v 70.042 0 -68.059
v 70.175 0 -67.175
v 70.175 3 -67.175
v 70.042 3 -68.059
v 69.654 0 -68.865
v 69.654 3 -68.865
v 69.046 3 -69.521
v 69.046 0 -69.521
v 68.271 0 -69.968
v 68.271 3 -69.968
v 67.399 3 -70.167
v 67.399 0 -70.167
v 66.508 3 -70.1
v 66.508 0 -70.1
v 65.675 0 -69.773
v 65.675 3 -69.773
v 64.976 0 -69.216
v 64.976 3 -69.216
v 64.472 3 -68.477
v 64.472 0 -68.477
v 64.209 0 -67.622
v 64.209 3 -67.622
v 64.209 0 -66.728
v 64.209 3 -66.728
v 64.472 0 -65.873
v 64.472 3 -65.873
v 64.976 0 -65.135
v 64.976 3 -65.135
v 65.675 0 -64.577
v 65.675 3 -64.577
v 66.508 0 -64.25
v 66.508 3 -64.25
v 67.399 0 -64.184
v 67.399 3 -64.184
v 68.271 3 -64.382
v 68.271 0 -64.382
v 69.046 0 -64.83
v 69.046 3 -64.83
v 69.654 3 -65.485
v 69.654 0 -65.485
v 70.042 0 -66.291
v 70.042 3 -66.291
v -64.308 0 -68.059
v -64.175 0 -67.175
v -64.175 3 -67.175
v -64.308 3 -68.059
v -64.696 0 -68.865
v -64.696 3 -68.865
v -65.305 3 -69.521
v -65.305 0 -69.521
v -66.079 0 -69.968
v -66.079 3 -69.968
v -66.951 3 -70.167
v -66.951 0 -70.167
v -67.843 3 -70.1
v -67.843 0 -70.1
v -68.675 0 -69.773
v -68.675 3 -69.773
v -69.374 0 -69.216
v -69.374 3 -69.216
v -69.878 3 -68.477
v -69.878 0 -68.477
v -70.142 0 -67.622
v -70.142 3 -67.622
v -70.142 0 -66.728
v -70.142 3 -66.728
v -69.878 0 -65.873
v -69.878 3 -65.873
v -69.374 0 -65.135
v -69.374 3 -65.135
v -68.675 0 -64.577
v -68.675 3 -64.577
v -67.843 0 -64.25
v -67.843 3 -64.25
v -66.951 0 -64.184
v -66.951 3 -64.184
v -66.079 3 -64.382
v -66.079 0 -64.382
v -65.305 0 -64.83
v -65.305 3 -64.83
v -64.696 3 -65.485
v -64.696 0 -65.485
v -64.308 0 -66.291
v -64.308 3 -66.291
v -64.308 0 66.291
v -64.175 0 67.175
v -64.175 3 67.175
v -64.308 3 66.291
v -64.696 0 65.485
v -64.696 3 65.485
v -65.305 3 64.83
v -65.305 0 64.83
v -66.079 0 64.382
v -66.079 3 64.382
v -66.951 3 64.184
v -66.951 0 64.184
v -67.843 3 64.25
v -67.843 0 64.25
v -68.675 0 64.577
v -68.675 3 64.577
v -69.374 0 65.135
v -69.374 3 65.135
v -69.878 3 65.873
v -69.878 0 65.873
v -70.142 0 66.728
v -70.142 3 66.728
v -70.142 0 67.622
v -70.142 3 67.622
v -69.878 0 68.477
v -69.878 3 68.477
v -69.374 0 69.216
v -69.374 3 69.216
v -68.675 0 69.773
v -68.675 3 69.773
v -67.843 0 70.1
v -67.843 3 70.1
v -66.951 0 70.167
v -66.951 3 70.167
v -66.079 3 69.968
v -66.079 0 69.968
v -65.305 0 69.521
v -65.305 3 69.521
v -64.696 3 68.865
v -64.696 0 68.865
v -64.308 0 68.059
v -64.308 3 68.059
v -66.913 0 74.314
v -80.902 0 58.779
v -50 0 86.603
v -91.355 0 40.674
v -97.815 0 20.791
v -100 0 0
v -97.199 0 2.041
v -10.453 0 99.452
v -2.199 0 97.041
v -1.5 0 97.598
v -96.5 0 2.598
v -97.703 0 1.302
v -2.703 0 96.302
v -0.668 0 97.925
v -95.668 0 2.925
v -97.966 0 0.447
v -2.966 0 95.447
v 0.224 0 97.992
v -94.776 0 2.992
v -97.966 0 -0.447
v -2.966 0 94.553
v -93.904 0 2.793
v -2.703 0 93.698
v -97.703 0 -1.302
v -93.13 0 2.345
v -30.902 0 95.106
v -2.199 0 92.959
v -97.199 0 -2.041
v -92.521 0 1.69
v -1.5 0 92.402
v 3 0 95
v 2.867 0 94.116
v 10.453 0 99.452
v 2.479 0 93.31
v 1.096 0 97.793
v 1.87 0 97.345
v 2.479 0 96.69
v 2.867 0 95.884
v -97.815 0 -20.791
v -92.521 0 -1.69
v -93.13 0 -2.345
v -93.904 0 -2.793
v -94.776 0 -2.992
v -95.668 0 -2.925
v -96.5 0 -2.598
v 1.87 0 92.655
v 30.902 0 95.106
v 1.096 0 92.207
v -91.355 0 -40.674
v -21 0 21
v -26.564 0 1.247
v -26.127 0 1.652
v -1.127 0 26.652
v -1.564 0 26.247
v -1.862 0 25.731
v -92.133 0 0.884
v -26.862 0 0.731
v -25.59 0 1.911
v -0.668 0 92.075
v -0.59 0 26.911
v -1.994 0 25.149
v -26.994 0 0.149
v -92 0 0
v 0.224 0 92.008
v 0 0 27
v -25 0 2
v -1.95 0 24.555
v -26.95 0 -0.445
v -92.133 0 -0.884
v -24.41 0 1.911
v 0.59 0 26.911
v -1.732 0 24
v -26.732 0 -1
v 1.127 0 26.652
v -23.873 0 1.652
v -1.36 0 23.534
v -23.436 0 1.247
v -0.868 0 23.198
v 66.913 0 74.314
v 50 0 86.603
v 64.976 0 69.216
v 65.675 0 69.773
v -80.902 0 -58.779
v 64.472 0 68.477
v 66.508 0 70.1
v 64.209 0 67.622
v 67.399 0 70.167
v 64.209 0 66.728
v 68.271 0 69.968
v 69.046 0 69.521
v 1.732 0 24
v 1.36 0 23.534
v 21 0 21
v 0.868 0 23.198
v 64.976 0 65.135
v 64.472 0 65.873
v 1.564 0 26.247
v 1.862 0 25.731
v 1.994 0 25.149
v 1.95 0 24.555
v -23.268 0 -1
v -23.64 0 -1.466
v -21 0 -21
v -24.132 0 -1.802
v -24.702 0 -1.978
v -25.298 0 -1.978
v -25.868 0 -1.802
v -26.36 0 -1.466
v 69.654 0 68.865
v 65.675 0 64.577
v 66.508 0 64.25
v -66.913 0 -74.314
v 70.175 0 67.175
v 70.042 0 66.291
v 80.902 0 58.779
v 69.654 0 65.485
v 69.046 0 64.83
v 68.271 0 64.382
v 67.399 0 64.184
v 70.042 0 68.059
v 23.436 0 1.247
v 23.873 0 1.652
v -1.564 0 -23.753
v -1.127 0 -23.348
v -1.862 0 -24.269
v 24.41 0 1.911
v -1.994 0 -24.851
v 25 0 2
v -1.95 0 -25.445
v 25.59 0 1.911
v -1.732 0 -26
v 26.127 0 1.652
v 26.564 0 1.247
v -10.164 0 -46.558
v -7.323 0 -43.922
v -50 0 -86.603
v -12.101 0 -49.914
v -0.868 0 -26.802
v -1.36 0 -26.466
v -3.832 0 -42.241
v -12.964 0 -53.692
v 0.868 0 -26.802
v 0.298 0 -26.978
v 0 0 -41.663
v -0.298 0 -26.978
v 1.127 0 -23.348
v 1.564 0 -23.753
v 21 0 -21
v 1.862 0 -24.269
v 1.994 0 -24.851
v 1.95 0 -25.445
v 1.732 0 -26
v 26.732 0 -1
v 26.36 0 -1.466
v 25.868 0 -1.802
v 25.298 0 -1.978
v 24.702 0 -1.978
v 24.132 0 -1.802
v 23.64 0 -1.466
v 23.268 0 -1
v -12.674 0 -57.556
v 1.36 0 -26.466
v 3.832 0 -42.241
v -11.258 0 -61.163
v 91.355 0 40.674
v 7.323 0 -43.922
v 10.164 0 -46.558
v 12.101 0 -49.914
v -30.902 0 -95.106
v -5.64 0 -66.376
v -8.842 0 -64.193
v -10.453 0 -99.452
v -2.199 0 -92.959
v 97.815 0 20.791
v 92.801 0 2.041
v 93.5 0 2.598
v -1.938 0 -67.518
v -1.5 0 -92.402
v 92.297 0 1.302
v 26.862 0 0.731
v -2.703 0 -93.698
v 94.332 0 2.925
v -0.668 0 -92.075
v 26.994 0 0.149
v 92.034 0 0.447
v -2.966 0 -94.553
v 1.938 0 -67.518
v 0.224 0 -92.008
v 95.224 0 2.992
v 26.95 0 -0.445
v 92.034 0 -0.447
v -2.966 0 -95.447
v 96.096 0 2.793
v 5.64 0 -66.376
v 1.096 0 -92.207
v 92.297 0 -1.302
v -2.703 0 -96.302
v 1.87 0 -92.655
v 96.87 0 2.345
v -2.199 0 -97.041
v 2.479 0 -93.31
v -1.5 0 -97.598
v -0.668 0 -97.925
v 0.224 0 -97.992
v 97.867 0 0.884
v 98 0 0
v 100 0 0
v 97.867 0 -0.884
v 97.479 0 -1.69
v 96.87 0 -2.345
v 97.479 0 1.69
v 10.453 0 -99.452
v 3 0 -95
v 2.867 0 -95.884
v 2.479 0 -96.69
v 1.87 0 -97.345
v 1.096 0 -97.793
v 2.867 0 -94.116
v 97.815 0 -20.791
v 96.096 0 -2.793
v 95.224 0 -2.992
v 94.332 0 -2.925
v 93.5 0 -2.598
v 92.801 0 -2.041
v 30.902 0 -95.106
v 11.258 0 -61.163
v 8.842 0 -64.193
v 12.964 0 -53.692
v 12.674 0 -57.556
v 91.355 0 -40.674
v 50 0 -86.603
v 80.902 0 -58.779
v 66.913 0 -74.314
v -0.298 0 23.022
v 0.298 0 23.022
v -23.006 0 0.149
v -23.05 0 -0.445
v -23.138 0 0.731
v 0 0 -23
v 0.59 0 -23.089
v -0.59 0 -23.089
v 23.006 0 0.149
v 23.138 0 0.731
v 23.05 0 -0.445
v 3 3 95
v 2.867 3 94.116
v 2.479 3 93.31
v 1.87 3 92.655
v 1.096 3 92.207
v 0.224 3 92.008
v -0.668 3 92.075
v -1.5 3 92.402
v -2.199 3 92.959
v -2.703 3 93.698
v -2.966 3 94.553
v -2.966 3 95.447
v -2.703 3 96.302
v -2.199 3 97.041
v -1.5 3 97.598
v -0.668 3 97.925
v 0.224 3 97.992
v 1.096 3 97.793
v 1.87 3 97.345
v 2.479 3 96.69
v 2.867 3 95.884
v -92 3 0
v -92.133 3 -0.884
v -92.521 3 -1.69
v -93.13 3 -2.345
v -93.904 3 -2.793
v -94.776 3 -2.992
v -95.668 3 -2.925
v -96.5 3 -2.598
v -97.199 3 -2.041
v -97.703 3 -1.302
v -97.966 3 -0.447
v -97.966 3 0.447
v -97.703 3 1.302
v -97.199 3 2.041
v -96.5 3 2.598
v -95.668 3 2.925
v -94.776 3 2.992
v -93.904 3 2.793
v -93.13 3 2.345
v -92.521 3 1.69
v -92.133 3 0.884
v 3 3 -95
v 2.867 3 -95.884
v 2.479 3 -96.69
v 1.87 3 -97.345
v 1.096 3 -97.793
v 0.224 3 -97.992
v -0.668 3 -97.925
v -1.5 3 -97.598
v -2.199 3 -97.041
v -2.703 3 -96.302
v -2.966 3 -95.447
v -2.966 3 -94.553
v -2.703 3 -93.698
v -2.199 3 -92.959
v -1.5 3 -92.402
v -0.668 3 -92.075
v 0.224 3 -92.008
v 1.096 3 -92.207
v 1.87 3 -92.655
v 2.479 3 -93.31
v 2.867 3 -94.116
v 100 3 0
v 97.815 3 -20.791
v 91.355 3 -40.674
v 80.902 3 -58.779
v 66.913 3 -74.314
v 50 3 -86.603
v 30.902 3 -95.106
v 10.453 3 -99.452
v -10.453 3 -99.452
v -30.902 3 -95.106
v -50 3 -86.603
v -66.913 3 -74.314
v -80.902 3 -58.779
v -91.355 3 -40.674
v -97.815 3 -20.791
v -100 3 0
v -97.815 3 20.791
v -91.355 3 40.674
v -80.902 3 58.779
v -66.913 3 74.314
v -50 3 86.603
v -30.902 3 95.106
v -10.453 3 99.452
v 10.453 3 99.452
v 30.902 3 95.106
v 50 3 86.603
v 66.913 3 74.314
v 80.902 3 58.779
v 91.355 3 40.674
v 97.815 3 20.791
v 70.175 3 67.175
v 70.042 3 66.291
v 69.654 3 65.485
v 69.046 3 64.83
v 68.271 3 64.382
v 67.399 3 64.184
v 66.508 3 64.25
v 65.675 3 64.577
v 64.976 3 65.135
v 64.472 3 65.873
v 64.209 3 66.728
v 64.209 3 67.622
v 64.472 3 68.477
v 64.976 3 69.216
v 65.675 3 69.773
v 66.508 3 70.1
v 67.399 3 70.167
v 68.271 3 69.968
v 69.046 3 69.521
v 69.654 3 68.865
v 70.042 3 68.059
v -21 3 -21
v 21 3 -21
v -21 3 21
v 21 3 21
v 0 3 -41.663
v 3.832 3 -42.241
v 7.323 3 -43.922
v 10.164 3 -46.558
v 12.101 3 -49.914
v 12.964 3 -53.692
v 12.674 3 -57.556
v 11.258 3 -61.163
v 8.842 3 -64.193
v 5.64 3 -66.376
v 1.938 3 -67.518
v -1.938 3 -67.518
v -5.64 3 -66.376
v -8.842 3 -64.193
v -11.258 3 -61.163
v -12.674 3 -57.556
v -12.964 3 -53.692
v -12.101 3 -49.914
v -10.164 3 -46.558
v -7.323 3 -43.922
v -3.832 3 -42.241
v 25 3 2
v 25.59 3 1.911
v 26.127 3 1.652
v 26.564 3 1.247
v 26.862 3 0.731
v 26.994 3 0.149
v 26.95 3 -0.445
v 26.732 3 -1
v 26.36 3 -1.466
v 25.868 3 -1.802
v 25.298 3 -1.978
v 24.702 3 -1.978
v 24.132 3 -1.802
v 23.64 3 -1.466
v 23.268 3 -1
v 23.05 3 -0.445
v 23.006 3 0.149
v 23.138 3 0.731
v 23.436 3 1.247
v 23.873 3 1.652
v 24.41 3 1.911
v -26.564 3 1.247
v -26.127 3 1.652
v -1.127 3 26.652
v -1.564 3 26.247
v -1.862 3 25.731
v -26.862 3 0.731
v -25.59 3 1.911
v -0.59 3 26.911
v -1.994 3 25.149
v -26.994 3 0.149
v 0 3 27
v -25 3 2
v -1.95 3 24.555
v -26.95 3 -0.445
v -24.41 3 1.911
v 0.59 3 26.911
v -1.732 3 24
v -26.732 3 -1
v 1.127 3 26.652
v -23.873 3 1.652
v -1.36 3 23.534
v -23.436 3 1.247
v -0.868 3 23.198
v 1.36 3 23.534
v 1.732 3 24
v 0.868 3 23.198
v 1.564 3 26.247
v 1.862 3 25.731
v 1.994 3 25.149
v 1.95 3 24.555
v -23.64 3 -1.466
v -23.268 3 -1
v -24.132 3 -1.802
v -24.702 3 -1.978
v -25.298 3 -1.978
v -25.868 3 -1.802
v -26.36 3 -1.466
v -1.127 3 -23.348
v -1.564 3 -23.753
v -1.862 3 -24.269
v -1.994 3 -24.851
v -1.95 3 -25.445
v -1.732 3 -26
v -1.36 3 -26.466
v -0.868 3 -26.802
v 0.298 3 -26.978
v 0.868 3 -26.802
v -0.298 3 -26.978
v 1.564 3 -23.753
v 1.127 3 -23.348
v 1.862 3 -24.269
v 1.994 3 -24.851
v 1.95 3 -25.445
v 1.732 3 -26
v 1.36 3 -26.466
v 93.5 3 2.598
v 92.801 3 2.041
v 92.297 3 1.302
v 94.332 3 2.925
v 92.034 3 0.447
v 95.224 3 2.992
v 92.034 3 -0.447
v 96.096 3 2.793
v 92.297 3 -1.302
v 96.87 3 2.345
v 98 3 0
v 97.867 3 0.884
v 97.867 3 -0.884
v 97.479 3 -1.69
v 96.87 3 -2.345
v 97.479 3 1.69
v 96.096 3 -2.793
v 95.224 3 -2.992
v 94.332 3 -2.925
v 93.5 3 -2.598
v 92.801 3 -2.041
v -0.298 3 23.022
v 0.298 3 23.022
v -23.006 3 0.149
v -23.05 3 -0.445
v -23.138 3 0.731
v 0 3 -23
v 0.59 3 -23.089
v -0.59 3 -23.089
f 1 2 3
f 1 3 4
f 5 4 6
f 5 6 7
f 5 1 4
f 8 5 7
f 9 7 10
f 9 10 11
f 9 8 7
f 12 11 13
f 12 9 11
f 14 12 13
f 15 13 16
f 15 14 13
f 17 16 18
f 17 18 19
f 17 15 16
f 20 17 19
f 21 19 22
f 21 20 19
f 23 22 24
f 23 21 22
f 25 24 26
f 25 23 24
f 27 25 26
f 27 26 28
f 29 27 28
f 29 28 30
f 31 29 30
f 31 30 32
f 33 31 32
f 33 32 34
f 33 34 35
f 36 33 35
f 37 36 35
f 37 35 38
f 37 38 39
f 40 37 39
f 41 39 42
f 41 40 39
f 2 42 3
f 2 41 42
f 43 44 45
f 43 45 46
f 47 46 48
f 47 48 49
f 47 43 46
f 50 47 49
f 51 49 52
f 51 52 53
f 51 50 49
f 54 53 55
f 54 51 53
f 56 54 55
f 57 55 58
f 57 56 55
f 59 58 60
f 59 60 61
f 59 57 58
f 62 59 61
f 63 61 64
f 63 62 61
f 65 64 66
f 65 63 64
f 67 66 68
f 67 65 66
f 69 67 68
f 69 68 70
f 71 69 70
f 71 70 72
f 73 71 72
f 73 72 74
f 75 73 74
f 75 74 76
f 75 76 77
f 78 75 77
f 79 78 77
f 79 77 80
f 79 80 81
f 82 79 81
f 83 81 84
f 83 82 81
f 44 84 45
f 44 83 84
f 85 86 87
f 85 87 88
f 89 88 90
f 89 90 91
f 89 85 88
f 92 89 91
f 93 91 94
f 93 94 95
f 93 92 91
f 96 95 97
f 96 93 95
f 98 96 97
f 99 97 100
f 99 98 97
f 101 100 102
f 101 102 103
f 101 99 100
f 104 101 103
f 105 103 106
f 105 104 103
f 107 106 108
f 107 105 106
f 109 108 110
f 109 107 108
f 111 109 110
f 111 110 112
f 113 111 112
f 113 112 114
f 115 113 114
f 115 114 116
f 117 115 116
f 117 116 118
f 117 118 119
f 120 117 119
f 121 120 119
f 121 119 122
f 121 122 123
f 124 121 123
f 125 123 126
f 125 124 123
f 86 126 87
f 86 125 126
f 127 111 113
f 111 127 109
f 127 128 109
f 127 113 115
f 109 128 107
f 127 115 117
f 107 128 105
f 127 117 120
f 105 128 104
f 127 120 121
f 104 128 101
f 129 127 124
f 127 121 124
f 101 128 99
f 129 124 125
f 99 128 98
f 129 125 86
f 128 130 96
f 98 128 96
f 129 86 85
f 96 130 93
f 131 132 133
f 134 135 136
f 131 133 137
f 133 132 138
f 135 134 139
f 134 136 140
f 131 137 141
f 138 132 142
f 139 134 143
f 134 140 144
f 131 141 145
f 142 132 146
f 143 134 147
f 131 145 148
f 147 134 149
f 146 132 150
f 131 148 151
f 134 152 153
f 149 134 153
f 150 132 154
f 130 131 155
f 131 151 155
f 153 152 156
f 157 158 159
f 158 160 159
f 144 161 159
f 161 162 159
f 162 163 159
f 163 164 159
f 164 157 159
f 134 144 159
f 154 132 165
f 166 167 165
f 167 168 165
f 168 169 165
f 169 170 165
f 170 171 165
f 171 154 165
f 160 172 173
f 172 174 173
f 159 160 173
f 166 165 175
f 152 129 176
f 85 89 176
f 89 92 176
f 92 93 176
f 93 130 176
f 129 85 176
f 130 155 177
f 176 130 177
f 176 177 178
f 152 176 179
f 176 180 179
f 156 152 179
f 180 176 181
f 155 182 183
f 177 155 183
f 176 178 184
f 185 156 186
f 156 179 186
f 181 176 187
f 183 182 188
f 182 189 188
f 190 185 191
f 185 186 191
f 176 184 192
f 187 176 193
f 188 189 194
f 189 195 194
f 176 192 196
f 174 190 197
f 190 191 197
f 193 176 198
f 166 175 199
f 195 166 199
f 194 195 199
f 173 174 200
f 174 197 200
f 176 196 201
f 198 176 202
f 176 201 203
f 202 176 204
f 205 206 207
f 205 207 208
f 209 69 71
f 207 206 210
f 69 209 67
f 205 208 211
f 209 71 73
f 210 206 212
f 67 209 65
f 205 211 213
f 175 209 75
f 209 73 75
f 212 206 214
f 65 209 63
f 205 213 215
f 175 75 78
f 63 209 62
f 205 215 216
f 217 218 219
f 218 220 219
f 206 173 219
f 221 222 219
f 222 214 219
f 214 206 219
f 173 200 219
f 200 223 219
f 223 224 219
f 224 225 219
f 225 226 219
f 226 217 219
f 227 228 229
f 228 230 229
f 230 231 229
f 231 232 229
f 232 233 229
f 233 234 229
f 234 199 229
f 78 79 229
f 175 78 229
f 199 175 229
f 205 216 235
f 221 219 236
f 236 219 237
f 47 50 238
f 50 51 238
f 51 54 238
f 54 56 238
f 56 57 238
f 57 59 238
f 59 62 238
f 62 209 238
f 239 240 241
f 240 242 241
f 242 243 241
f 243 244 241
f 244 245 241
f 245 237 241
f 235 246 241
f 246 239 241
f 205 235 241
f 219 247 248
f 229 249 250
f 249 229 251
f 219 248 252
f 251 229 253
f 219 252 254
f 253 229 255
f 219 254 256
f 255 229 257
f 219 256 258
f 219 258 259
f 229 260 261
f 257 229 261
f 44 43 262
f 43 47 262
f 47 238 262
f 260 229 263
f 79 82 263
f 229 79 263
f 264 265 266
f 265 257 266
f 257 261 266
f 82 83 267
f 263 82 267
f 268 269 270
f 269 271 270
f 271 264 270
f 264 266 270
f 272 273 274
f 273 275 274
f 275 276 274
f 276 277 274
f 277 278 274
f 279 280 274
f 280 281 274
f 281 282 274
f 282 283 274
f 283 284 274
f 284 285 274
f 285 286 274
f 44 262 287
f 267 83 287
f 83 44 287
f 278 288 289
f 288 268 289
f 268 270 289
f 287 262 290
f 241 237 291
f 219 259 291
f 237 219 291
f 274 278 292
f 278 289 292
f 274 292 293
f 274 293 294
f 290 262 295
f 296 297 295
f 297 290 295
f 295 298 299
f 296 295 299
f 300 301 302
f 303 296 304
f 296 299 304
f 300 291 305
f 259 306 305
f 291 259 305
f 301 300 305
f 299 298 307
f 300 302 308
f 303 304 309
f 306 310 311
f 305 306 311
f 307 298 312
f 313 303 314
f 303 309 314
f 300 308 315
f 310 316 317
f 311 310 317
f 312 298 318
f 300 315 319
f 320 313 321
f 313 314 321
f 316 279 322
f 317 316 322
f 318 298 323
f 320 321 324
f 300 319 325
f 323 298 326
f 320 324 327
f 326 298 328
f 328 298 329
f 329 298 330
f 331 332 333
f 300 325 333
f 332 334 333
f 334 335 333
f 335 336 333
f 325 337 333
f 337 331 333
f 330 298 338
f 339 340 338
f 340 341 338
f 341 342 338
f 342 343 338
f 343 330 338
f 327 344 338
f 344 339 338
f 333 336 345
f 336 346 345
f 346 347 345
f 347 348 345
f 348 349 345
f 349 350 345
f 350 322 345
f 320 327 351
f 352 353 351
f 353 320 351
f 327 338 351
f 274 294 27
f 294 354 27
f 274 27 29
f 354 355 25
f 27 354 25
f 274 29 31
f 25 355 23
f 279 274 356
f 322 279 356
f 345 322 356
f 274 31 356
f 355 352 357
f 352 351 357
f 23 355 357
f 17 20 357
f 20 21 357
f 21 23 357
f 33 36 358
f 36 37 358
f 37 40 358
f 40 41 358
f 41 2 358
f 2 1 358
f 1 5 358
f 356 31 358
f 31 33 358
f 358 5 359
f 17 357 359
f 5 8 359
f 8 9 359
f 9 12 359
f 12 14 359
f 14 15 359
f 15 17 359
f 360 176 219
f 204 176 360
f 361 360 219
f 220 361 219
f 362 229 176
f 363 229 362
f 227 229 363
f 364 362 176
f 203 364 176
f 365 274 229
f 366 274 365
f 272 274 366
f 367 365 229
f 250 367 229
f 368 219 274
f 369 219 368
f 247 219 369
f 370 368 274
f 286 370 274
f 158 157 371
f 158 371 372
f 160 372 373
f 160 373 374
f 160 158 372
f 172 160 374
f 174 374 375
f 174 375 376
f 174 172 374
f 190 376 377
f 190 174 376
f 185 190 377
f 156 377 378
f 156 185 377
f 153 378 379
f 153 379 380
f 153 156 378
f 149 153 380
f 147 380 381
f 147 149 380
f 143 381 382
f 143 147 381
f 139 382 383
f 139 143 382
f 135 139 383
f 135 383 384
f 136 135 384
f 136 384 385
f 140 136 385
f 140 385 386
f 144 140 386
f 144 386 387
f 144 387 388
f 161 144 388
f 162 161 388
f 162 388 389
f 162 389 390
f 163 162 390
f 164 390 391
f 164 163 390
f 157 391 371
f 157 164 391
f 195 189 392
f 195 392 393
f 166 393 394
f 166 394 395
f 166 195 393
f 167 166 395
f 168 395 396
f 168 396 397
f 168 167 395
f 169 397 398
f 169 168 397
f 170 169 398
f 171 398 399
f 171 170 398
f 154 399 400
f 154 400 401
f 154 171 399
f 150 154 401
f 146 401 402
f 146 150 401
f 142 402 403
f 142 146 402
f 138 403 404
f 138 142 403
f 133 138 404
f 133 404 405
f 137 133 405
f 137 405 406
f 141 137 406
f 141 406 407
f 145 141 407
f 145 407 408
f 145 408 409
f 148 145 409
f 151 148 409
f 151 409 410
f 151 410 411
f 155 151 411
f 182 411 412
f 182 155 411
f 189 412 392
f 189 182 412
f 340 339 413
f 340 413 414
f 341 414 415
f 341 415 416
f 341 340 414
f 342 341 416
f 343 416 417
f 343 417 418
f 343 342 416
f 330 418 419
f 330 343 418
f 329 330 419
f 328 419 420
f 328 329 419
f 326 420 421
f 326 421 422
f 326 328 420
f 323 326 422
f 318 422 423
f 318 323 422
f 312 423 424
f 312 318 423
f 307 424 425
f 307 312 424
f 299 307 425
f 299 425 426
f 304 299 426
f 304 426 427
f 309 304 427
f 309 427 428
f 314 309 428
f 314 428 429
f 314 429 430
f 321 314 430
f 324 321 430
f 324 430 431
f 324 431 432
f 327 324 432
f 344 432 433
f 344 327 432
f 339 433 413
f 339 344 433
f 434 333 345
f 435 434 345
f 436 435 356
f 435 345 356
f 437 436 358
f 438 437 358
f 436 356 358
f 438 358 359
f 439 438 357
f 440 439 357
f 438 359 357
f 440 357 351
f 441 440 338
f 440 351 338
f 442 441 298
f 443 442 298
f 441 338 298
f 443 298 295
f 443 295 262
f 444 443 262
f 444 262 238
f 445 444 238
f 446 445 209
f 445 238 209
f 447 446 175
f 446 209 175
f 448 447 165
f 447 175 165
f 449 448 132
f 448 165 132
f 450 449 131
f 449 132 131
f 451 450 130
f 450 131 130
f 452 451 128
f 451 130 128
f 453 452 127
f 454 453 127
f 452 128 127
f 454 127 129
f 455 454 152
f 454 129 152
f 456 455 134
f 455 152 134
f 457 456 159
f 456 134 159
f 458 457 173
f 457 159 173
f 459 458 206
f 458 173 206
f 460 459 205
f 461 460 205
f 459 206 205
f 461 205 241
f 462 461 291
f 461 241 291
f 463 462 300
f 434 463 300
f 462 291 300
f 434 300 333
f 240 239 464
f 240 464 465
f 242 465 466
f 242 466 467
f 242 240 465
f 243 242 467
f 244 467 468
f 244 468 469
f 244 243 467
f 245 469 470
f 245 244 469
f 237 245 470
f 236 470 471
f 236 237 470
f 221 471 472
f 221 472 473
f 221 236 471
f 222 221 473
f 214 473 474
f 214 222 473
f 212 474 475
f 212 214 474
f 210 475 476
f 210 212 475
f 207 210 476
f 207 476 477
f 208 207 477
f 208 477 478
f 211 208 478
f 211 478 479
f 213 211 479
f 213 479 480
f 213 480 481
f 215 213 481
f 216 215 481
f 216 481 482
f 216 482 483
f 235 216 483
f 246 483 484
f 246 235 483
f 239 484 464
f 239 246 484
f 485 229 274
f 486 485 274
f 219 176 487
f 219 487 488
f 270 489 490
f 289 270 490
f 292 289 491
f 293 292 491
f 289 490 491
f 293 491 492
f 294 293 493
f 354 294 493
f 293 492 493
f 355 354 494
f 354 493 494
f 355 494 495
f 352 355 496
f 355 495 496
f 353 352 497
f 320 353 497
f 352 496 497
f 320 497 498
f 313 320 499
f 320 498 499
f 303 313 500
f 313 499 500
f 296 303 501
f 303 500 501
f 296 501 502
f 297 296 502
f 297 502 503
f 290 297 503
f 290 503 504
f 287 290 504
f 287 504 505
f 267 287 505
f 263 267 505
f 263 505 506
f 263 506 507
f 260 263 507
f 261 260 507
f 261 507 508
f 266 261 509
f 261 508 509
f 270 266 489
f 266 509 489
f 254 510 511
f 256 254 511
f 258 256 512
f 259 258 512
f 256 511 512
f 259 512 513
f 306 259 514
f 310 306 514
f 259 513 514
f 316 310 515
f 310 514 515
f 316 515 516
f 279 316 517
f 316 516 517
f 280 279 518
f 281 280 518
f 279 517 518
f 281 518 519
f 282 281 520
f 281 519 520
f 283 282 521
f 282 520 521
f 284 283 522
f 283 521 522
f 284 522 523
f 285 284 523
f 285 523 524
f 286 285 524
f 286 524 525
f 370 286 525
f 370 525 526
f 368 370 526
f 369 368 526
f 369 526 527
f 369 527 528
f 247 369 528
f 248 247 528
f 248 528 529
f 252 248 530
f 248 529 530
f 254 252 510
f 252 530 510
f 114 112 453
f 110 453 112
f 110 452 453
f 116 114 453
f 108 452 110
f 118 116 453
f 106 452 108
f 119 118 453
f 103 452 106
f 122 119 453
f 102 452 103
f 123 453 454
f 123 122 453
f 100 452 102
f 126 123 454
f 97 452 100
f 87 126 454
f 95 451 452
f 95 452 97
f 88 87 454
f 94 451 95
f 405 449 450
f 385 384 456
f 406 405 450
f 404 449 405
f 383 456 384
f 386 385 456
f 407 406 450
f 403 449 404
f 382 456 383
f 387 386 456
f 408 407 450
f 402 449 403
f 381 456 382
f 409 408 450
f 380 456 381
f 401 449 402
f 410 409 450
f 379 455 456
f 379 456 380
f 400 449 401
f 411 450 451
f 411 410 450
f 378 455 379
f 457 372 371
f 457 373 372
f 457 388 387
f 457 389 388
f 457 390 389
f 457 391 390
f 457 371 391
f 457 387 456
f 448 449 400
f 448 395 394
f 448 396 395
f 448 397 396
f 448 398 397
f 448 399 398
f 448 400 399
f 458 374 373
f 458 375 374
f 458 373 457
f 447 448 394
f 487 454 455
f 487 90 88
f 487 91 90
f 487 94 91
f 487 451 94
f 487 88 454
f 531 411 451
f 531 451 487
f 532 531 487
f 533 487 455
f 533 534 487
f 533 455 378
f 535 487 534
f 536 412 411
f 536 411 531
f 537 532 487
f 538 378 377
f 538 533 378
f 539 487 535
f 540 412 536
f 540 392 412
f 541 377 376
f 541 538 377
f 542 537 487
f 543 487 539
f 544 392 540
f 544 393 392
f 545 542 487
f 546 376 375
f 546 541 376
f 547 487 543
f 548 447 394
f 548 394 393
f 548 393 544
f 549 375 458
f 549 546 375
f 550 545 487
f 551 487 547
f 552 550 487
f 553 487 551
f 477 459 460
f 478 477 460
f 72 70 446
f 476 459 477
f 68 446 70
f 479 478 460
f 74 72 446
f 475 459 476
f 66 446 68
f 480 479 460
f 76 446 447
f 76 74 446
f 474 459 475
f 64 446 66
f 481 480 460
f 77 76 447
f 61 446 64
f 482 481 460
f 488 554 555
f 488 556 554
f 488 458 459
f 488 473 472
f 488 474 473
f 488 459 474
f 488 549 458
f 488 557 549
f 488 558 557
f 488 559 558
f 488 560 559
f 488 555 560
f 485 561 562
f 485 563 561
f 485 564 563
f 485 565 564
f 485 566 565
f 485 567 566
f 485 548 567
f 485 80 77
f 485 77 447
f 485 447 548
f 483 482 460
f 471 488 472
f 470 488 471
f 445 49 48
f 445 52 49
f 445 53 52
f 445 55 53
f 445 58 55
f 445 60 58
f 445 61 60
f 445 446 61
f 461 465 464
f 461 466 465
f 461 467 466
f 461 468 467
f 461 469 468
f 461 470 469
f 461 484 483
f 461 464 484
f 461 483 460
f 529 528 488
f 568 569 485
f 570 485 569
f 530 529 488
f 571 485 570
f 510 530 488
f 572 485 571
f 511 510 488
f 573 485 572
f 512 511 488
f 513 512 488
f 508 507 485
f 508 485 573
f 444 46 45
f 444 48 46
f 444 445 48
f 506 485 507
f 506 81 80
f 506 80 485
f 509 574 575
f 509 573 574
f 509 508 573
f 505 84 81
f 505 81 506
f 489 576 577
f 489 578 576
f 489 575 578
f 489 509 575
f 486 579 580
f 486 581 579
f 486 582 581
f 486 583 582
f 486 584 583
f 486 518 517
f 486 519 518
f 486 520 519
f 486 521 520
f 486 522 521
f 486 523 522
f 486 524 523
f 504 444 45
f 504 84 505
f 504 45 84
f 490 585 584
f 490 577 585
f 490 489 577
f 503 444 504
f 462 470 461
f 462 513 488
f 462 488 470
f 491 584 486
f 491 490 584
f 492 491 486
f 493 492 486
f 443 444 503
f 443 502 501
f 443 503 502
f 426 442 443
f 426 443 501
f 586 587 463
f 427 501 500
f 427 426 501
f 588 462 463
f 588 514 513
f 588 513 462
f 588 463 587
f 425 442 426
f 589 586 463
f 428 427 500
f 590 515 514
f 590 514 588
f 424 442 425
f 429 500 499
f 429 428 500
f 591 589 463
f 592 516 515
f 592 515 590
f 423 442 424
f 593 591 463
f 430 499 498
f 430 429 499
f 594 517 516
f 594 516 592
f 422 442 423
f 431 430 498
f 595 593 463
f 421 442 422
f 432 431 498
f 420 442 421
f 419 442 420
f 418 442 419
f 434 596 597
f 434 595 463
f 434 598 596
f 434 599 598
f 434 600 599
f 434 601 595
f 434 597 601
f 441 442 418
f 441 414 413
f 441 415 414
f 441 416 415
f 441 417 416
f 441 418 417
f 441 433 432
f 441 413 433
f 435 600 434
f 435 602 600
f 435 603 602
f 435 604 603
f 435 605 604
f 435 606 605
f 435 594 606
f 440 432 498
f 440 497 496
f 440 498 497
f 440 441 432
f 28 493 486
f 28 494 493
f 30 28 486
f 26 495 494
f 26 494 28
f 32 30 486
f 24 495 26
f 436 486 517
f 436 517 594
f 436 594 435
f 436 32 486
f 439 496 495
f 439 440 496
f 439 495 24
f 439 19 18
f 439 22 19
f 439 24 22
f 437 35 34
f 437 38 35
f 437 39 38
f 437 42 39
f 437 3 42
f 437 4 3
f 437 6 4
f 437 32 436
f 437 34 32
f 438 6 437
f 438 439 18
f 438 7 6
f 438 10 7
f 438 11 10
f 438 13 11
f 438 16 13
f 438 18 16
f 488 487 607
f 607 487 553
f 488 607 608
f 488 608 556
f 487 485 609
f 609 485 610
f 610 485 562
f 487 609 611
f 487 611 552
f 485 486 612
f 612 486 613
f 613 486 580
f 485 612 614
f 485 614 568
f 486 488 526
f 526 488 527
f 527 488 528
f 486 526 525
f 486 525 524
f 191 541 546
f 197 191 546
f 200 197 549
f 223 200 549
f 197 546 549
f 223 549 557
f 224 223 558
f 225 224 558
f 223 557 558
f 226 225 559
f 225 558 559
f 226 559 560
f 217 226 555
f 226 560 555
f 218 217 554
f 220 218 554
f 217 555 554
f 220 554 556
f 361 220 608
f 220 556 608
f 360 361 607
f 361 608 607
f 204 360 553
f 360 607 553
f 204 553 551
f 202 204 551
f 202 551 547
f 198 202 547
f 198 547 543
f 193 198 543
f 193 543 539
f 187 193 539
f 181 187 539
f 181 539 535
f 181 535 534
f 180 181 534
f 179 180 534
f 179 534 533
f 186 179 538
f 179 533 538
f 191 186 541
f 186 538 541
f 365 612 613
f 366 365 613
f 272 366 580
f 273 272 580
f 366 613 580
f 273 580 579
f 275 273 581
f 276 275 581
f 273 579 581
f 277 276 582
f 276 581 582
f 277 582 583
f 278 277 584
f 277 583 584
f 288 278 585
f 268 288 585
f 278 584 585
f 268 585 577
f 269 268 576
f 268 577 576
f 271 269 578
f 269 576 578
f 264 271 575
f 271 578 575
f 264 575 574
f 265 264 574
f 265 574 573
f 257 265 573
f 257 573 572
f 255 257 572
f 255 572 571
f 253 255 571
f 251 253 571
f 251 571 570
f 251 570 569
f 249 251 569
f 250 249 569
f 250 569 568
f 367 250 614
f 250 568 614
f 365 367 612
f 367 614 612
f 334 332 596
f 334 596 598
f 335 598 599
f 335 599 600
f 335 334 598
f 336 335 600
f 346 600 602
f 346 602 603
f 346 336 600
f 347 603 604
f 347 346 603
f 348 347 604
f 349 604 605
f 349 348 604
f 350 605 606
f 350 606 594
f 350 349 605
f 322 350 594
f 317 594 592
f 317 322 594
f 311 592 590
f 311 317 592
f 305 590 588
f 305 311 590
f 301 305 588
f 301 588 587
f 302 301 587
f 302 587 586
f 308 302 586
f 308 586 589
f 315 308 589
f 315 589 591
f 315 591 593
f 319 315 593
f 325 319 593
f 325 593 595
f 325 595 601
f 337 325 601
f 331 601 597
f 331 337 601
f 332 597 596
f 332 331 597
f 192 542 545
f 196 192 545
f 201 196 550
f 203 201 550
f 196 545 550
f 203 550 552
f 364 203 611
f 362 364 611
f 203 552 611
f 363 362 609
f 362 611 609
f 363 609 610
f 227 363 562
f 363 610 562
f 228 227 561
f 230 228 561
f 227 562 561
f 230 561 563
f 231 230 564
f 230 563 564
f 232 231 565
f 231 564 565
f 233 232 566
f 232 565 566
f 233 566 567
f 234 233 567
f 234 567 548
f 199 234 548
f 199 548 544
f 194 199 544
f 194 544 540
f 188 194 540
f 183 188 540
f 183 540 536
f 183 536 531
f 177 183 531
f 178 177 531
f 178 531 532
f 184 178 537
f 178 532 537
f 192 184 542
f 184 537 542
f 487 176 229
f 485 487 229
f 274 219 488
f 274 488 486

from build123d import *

# Parameters (mm, degrees)
EXTRUDE_1_OUTLINE_R   = 100
EXTRUDE_1_OUTLINE_R_2 = 3
EXTRUDE_1_OUTLINE_W   = 42
EXTRUDE_1_OUTLINE_H   = 42
EXTRUDE_1_DEPTH       = 3
SKETCH_2_R            = 13
SKETCH_2_R_2          = 2
CUT_EXTRUDE_1_DEPTH   = 3


# Read off the part's stored shape, not the designer's step: Бобышка-Вытянуть1
with BuildPart() as part:
    # Бобышка-Вытянуть1 outline → Бобышка-Вытянуть1 (new body)
    with BuildSketch(Plane(origin=(0, 0, 0), x_dir=(1, 0, 0), z_dir=(0, 1, 0))):
        Circle(EXTRUDE_1_OUTLINE_R)
        with Locations((-67.175120484, -67.175120484)):
            Circle(EXTRUDE_1_OUTLINE_R_2, mode=Mode.SUBTRACT)
        with Locations((0, -95)):
            Circle(EXTRUDE_1_OUTLINE_R_2, mode=Mode.SUBTRACT)
        with Locations((67.175120484, -67.175120484)):
            Circle(EXTRUDE_1_OUTLINE_R_2, mode=Mode.SUBTRACT)
        with Locations((-95, 0)):
            Circle(EXTRUDE_1_OUTLINE_R_2, mode=Mode.SUBTRACT)
        with Locations((-67.175120484, 67.175120484)):
            Circle(EXTRUDE_1_OUTLINE_R_2, mode=Mode.SUBTRACT)
        Rectangle(EXTRUDE_1_OUTLINE_W, EXTRUDE_1_OUTLINE_H, mode=Mode.SUBTRACT)
        with Locations((95, 0)):
            Circle(EXTRUDE_1_OUTLINE_R_2, mode=Mode.SUBTRACT)
        with Locations((0, 95)):
            Circle(EXTRUDE_1_OUTLINE_R_2, mode=Mode.SUBTRACT)
        with Locations((67.175120484, 67.175120484)):
            Circle(EXTRUDE_1_OUTLINE_R_2, mode=Mode.SUBTRACT)
    extrude(amount=EXTRUDE_1_DEPTH)

    # Эскиз2 → Вырез-Вытянуть1 (cut)
    with BuildSketch(Plane(origin=(0, 3, 0), x_dir=(1, 0, 0), z_dir=(0, 1, 0))):
        with Locations(Location((0, 54.663461451, 0), (0, 0, 270))):
            Circle(SKETCH_2_R)
        with Locations(Location((25, 0, 0), (0, 0, 270))):
            Circle(SKETCH_2_R_2)
        with Locations(Location((0, 25, 0), (0, 0, 270))):
            Circle(SKETCH_2_R_2)
        with Locations(Location((-25, 0, 0), (0, 0, 270))):
            Circle(SKETCH_2_R_2)
        with Locations(Location((0, -25, 0), (0, 0, 270))):
            Circle(SKETCH_2_R_2)
    extrude(amount=-CUT_EXTRUDE_1_DEPTH, mode=Mode.SUBTRACT)


solid = part.part
